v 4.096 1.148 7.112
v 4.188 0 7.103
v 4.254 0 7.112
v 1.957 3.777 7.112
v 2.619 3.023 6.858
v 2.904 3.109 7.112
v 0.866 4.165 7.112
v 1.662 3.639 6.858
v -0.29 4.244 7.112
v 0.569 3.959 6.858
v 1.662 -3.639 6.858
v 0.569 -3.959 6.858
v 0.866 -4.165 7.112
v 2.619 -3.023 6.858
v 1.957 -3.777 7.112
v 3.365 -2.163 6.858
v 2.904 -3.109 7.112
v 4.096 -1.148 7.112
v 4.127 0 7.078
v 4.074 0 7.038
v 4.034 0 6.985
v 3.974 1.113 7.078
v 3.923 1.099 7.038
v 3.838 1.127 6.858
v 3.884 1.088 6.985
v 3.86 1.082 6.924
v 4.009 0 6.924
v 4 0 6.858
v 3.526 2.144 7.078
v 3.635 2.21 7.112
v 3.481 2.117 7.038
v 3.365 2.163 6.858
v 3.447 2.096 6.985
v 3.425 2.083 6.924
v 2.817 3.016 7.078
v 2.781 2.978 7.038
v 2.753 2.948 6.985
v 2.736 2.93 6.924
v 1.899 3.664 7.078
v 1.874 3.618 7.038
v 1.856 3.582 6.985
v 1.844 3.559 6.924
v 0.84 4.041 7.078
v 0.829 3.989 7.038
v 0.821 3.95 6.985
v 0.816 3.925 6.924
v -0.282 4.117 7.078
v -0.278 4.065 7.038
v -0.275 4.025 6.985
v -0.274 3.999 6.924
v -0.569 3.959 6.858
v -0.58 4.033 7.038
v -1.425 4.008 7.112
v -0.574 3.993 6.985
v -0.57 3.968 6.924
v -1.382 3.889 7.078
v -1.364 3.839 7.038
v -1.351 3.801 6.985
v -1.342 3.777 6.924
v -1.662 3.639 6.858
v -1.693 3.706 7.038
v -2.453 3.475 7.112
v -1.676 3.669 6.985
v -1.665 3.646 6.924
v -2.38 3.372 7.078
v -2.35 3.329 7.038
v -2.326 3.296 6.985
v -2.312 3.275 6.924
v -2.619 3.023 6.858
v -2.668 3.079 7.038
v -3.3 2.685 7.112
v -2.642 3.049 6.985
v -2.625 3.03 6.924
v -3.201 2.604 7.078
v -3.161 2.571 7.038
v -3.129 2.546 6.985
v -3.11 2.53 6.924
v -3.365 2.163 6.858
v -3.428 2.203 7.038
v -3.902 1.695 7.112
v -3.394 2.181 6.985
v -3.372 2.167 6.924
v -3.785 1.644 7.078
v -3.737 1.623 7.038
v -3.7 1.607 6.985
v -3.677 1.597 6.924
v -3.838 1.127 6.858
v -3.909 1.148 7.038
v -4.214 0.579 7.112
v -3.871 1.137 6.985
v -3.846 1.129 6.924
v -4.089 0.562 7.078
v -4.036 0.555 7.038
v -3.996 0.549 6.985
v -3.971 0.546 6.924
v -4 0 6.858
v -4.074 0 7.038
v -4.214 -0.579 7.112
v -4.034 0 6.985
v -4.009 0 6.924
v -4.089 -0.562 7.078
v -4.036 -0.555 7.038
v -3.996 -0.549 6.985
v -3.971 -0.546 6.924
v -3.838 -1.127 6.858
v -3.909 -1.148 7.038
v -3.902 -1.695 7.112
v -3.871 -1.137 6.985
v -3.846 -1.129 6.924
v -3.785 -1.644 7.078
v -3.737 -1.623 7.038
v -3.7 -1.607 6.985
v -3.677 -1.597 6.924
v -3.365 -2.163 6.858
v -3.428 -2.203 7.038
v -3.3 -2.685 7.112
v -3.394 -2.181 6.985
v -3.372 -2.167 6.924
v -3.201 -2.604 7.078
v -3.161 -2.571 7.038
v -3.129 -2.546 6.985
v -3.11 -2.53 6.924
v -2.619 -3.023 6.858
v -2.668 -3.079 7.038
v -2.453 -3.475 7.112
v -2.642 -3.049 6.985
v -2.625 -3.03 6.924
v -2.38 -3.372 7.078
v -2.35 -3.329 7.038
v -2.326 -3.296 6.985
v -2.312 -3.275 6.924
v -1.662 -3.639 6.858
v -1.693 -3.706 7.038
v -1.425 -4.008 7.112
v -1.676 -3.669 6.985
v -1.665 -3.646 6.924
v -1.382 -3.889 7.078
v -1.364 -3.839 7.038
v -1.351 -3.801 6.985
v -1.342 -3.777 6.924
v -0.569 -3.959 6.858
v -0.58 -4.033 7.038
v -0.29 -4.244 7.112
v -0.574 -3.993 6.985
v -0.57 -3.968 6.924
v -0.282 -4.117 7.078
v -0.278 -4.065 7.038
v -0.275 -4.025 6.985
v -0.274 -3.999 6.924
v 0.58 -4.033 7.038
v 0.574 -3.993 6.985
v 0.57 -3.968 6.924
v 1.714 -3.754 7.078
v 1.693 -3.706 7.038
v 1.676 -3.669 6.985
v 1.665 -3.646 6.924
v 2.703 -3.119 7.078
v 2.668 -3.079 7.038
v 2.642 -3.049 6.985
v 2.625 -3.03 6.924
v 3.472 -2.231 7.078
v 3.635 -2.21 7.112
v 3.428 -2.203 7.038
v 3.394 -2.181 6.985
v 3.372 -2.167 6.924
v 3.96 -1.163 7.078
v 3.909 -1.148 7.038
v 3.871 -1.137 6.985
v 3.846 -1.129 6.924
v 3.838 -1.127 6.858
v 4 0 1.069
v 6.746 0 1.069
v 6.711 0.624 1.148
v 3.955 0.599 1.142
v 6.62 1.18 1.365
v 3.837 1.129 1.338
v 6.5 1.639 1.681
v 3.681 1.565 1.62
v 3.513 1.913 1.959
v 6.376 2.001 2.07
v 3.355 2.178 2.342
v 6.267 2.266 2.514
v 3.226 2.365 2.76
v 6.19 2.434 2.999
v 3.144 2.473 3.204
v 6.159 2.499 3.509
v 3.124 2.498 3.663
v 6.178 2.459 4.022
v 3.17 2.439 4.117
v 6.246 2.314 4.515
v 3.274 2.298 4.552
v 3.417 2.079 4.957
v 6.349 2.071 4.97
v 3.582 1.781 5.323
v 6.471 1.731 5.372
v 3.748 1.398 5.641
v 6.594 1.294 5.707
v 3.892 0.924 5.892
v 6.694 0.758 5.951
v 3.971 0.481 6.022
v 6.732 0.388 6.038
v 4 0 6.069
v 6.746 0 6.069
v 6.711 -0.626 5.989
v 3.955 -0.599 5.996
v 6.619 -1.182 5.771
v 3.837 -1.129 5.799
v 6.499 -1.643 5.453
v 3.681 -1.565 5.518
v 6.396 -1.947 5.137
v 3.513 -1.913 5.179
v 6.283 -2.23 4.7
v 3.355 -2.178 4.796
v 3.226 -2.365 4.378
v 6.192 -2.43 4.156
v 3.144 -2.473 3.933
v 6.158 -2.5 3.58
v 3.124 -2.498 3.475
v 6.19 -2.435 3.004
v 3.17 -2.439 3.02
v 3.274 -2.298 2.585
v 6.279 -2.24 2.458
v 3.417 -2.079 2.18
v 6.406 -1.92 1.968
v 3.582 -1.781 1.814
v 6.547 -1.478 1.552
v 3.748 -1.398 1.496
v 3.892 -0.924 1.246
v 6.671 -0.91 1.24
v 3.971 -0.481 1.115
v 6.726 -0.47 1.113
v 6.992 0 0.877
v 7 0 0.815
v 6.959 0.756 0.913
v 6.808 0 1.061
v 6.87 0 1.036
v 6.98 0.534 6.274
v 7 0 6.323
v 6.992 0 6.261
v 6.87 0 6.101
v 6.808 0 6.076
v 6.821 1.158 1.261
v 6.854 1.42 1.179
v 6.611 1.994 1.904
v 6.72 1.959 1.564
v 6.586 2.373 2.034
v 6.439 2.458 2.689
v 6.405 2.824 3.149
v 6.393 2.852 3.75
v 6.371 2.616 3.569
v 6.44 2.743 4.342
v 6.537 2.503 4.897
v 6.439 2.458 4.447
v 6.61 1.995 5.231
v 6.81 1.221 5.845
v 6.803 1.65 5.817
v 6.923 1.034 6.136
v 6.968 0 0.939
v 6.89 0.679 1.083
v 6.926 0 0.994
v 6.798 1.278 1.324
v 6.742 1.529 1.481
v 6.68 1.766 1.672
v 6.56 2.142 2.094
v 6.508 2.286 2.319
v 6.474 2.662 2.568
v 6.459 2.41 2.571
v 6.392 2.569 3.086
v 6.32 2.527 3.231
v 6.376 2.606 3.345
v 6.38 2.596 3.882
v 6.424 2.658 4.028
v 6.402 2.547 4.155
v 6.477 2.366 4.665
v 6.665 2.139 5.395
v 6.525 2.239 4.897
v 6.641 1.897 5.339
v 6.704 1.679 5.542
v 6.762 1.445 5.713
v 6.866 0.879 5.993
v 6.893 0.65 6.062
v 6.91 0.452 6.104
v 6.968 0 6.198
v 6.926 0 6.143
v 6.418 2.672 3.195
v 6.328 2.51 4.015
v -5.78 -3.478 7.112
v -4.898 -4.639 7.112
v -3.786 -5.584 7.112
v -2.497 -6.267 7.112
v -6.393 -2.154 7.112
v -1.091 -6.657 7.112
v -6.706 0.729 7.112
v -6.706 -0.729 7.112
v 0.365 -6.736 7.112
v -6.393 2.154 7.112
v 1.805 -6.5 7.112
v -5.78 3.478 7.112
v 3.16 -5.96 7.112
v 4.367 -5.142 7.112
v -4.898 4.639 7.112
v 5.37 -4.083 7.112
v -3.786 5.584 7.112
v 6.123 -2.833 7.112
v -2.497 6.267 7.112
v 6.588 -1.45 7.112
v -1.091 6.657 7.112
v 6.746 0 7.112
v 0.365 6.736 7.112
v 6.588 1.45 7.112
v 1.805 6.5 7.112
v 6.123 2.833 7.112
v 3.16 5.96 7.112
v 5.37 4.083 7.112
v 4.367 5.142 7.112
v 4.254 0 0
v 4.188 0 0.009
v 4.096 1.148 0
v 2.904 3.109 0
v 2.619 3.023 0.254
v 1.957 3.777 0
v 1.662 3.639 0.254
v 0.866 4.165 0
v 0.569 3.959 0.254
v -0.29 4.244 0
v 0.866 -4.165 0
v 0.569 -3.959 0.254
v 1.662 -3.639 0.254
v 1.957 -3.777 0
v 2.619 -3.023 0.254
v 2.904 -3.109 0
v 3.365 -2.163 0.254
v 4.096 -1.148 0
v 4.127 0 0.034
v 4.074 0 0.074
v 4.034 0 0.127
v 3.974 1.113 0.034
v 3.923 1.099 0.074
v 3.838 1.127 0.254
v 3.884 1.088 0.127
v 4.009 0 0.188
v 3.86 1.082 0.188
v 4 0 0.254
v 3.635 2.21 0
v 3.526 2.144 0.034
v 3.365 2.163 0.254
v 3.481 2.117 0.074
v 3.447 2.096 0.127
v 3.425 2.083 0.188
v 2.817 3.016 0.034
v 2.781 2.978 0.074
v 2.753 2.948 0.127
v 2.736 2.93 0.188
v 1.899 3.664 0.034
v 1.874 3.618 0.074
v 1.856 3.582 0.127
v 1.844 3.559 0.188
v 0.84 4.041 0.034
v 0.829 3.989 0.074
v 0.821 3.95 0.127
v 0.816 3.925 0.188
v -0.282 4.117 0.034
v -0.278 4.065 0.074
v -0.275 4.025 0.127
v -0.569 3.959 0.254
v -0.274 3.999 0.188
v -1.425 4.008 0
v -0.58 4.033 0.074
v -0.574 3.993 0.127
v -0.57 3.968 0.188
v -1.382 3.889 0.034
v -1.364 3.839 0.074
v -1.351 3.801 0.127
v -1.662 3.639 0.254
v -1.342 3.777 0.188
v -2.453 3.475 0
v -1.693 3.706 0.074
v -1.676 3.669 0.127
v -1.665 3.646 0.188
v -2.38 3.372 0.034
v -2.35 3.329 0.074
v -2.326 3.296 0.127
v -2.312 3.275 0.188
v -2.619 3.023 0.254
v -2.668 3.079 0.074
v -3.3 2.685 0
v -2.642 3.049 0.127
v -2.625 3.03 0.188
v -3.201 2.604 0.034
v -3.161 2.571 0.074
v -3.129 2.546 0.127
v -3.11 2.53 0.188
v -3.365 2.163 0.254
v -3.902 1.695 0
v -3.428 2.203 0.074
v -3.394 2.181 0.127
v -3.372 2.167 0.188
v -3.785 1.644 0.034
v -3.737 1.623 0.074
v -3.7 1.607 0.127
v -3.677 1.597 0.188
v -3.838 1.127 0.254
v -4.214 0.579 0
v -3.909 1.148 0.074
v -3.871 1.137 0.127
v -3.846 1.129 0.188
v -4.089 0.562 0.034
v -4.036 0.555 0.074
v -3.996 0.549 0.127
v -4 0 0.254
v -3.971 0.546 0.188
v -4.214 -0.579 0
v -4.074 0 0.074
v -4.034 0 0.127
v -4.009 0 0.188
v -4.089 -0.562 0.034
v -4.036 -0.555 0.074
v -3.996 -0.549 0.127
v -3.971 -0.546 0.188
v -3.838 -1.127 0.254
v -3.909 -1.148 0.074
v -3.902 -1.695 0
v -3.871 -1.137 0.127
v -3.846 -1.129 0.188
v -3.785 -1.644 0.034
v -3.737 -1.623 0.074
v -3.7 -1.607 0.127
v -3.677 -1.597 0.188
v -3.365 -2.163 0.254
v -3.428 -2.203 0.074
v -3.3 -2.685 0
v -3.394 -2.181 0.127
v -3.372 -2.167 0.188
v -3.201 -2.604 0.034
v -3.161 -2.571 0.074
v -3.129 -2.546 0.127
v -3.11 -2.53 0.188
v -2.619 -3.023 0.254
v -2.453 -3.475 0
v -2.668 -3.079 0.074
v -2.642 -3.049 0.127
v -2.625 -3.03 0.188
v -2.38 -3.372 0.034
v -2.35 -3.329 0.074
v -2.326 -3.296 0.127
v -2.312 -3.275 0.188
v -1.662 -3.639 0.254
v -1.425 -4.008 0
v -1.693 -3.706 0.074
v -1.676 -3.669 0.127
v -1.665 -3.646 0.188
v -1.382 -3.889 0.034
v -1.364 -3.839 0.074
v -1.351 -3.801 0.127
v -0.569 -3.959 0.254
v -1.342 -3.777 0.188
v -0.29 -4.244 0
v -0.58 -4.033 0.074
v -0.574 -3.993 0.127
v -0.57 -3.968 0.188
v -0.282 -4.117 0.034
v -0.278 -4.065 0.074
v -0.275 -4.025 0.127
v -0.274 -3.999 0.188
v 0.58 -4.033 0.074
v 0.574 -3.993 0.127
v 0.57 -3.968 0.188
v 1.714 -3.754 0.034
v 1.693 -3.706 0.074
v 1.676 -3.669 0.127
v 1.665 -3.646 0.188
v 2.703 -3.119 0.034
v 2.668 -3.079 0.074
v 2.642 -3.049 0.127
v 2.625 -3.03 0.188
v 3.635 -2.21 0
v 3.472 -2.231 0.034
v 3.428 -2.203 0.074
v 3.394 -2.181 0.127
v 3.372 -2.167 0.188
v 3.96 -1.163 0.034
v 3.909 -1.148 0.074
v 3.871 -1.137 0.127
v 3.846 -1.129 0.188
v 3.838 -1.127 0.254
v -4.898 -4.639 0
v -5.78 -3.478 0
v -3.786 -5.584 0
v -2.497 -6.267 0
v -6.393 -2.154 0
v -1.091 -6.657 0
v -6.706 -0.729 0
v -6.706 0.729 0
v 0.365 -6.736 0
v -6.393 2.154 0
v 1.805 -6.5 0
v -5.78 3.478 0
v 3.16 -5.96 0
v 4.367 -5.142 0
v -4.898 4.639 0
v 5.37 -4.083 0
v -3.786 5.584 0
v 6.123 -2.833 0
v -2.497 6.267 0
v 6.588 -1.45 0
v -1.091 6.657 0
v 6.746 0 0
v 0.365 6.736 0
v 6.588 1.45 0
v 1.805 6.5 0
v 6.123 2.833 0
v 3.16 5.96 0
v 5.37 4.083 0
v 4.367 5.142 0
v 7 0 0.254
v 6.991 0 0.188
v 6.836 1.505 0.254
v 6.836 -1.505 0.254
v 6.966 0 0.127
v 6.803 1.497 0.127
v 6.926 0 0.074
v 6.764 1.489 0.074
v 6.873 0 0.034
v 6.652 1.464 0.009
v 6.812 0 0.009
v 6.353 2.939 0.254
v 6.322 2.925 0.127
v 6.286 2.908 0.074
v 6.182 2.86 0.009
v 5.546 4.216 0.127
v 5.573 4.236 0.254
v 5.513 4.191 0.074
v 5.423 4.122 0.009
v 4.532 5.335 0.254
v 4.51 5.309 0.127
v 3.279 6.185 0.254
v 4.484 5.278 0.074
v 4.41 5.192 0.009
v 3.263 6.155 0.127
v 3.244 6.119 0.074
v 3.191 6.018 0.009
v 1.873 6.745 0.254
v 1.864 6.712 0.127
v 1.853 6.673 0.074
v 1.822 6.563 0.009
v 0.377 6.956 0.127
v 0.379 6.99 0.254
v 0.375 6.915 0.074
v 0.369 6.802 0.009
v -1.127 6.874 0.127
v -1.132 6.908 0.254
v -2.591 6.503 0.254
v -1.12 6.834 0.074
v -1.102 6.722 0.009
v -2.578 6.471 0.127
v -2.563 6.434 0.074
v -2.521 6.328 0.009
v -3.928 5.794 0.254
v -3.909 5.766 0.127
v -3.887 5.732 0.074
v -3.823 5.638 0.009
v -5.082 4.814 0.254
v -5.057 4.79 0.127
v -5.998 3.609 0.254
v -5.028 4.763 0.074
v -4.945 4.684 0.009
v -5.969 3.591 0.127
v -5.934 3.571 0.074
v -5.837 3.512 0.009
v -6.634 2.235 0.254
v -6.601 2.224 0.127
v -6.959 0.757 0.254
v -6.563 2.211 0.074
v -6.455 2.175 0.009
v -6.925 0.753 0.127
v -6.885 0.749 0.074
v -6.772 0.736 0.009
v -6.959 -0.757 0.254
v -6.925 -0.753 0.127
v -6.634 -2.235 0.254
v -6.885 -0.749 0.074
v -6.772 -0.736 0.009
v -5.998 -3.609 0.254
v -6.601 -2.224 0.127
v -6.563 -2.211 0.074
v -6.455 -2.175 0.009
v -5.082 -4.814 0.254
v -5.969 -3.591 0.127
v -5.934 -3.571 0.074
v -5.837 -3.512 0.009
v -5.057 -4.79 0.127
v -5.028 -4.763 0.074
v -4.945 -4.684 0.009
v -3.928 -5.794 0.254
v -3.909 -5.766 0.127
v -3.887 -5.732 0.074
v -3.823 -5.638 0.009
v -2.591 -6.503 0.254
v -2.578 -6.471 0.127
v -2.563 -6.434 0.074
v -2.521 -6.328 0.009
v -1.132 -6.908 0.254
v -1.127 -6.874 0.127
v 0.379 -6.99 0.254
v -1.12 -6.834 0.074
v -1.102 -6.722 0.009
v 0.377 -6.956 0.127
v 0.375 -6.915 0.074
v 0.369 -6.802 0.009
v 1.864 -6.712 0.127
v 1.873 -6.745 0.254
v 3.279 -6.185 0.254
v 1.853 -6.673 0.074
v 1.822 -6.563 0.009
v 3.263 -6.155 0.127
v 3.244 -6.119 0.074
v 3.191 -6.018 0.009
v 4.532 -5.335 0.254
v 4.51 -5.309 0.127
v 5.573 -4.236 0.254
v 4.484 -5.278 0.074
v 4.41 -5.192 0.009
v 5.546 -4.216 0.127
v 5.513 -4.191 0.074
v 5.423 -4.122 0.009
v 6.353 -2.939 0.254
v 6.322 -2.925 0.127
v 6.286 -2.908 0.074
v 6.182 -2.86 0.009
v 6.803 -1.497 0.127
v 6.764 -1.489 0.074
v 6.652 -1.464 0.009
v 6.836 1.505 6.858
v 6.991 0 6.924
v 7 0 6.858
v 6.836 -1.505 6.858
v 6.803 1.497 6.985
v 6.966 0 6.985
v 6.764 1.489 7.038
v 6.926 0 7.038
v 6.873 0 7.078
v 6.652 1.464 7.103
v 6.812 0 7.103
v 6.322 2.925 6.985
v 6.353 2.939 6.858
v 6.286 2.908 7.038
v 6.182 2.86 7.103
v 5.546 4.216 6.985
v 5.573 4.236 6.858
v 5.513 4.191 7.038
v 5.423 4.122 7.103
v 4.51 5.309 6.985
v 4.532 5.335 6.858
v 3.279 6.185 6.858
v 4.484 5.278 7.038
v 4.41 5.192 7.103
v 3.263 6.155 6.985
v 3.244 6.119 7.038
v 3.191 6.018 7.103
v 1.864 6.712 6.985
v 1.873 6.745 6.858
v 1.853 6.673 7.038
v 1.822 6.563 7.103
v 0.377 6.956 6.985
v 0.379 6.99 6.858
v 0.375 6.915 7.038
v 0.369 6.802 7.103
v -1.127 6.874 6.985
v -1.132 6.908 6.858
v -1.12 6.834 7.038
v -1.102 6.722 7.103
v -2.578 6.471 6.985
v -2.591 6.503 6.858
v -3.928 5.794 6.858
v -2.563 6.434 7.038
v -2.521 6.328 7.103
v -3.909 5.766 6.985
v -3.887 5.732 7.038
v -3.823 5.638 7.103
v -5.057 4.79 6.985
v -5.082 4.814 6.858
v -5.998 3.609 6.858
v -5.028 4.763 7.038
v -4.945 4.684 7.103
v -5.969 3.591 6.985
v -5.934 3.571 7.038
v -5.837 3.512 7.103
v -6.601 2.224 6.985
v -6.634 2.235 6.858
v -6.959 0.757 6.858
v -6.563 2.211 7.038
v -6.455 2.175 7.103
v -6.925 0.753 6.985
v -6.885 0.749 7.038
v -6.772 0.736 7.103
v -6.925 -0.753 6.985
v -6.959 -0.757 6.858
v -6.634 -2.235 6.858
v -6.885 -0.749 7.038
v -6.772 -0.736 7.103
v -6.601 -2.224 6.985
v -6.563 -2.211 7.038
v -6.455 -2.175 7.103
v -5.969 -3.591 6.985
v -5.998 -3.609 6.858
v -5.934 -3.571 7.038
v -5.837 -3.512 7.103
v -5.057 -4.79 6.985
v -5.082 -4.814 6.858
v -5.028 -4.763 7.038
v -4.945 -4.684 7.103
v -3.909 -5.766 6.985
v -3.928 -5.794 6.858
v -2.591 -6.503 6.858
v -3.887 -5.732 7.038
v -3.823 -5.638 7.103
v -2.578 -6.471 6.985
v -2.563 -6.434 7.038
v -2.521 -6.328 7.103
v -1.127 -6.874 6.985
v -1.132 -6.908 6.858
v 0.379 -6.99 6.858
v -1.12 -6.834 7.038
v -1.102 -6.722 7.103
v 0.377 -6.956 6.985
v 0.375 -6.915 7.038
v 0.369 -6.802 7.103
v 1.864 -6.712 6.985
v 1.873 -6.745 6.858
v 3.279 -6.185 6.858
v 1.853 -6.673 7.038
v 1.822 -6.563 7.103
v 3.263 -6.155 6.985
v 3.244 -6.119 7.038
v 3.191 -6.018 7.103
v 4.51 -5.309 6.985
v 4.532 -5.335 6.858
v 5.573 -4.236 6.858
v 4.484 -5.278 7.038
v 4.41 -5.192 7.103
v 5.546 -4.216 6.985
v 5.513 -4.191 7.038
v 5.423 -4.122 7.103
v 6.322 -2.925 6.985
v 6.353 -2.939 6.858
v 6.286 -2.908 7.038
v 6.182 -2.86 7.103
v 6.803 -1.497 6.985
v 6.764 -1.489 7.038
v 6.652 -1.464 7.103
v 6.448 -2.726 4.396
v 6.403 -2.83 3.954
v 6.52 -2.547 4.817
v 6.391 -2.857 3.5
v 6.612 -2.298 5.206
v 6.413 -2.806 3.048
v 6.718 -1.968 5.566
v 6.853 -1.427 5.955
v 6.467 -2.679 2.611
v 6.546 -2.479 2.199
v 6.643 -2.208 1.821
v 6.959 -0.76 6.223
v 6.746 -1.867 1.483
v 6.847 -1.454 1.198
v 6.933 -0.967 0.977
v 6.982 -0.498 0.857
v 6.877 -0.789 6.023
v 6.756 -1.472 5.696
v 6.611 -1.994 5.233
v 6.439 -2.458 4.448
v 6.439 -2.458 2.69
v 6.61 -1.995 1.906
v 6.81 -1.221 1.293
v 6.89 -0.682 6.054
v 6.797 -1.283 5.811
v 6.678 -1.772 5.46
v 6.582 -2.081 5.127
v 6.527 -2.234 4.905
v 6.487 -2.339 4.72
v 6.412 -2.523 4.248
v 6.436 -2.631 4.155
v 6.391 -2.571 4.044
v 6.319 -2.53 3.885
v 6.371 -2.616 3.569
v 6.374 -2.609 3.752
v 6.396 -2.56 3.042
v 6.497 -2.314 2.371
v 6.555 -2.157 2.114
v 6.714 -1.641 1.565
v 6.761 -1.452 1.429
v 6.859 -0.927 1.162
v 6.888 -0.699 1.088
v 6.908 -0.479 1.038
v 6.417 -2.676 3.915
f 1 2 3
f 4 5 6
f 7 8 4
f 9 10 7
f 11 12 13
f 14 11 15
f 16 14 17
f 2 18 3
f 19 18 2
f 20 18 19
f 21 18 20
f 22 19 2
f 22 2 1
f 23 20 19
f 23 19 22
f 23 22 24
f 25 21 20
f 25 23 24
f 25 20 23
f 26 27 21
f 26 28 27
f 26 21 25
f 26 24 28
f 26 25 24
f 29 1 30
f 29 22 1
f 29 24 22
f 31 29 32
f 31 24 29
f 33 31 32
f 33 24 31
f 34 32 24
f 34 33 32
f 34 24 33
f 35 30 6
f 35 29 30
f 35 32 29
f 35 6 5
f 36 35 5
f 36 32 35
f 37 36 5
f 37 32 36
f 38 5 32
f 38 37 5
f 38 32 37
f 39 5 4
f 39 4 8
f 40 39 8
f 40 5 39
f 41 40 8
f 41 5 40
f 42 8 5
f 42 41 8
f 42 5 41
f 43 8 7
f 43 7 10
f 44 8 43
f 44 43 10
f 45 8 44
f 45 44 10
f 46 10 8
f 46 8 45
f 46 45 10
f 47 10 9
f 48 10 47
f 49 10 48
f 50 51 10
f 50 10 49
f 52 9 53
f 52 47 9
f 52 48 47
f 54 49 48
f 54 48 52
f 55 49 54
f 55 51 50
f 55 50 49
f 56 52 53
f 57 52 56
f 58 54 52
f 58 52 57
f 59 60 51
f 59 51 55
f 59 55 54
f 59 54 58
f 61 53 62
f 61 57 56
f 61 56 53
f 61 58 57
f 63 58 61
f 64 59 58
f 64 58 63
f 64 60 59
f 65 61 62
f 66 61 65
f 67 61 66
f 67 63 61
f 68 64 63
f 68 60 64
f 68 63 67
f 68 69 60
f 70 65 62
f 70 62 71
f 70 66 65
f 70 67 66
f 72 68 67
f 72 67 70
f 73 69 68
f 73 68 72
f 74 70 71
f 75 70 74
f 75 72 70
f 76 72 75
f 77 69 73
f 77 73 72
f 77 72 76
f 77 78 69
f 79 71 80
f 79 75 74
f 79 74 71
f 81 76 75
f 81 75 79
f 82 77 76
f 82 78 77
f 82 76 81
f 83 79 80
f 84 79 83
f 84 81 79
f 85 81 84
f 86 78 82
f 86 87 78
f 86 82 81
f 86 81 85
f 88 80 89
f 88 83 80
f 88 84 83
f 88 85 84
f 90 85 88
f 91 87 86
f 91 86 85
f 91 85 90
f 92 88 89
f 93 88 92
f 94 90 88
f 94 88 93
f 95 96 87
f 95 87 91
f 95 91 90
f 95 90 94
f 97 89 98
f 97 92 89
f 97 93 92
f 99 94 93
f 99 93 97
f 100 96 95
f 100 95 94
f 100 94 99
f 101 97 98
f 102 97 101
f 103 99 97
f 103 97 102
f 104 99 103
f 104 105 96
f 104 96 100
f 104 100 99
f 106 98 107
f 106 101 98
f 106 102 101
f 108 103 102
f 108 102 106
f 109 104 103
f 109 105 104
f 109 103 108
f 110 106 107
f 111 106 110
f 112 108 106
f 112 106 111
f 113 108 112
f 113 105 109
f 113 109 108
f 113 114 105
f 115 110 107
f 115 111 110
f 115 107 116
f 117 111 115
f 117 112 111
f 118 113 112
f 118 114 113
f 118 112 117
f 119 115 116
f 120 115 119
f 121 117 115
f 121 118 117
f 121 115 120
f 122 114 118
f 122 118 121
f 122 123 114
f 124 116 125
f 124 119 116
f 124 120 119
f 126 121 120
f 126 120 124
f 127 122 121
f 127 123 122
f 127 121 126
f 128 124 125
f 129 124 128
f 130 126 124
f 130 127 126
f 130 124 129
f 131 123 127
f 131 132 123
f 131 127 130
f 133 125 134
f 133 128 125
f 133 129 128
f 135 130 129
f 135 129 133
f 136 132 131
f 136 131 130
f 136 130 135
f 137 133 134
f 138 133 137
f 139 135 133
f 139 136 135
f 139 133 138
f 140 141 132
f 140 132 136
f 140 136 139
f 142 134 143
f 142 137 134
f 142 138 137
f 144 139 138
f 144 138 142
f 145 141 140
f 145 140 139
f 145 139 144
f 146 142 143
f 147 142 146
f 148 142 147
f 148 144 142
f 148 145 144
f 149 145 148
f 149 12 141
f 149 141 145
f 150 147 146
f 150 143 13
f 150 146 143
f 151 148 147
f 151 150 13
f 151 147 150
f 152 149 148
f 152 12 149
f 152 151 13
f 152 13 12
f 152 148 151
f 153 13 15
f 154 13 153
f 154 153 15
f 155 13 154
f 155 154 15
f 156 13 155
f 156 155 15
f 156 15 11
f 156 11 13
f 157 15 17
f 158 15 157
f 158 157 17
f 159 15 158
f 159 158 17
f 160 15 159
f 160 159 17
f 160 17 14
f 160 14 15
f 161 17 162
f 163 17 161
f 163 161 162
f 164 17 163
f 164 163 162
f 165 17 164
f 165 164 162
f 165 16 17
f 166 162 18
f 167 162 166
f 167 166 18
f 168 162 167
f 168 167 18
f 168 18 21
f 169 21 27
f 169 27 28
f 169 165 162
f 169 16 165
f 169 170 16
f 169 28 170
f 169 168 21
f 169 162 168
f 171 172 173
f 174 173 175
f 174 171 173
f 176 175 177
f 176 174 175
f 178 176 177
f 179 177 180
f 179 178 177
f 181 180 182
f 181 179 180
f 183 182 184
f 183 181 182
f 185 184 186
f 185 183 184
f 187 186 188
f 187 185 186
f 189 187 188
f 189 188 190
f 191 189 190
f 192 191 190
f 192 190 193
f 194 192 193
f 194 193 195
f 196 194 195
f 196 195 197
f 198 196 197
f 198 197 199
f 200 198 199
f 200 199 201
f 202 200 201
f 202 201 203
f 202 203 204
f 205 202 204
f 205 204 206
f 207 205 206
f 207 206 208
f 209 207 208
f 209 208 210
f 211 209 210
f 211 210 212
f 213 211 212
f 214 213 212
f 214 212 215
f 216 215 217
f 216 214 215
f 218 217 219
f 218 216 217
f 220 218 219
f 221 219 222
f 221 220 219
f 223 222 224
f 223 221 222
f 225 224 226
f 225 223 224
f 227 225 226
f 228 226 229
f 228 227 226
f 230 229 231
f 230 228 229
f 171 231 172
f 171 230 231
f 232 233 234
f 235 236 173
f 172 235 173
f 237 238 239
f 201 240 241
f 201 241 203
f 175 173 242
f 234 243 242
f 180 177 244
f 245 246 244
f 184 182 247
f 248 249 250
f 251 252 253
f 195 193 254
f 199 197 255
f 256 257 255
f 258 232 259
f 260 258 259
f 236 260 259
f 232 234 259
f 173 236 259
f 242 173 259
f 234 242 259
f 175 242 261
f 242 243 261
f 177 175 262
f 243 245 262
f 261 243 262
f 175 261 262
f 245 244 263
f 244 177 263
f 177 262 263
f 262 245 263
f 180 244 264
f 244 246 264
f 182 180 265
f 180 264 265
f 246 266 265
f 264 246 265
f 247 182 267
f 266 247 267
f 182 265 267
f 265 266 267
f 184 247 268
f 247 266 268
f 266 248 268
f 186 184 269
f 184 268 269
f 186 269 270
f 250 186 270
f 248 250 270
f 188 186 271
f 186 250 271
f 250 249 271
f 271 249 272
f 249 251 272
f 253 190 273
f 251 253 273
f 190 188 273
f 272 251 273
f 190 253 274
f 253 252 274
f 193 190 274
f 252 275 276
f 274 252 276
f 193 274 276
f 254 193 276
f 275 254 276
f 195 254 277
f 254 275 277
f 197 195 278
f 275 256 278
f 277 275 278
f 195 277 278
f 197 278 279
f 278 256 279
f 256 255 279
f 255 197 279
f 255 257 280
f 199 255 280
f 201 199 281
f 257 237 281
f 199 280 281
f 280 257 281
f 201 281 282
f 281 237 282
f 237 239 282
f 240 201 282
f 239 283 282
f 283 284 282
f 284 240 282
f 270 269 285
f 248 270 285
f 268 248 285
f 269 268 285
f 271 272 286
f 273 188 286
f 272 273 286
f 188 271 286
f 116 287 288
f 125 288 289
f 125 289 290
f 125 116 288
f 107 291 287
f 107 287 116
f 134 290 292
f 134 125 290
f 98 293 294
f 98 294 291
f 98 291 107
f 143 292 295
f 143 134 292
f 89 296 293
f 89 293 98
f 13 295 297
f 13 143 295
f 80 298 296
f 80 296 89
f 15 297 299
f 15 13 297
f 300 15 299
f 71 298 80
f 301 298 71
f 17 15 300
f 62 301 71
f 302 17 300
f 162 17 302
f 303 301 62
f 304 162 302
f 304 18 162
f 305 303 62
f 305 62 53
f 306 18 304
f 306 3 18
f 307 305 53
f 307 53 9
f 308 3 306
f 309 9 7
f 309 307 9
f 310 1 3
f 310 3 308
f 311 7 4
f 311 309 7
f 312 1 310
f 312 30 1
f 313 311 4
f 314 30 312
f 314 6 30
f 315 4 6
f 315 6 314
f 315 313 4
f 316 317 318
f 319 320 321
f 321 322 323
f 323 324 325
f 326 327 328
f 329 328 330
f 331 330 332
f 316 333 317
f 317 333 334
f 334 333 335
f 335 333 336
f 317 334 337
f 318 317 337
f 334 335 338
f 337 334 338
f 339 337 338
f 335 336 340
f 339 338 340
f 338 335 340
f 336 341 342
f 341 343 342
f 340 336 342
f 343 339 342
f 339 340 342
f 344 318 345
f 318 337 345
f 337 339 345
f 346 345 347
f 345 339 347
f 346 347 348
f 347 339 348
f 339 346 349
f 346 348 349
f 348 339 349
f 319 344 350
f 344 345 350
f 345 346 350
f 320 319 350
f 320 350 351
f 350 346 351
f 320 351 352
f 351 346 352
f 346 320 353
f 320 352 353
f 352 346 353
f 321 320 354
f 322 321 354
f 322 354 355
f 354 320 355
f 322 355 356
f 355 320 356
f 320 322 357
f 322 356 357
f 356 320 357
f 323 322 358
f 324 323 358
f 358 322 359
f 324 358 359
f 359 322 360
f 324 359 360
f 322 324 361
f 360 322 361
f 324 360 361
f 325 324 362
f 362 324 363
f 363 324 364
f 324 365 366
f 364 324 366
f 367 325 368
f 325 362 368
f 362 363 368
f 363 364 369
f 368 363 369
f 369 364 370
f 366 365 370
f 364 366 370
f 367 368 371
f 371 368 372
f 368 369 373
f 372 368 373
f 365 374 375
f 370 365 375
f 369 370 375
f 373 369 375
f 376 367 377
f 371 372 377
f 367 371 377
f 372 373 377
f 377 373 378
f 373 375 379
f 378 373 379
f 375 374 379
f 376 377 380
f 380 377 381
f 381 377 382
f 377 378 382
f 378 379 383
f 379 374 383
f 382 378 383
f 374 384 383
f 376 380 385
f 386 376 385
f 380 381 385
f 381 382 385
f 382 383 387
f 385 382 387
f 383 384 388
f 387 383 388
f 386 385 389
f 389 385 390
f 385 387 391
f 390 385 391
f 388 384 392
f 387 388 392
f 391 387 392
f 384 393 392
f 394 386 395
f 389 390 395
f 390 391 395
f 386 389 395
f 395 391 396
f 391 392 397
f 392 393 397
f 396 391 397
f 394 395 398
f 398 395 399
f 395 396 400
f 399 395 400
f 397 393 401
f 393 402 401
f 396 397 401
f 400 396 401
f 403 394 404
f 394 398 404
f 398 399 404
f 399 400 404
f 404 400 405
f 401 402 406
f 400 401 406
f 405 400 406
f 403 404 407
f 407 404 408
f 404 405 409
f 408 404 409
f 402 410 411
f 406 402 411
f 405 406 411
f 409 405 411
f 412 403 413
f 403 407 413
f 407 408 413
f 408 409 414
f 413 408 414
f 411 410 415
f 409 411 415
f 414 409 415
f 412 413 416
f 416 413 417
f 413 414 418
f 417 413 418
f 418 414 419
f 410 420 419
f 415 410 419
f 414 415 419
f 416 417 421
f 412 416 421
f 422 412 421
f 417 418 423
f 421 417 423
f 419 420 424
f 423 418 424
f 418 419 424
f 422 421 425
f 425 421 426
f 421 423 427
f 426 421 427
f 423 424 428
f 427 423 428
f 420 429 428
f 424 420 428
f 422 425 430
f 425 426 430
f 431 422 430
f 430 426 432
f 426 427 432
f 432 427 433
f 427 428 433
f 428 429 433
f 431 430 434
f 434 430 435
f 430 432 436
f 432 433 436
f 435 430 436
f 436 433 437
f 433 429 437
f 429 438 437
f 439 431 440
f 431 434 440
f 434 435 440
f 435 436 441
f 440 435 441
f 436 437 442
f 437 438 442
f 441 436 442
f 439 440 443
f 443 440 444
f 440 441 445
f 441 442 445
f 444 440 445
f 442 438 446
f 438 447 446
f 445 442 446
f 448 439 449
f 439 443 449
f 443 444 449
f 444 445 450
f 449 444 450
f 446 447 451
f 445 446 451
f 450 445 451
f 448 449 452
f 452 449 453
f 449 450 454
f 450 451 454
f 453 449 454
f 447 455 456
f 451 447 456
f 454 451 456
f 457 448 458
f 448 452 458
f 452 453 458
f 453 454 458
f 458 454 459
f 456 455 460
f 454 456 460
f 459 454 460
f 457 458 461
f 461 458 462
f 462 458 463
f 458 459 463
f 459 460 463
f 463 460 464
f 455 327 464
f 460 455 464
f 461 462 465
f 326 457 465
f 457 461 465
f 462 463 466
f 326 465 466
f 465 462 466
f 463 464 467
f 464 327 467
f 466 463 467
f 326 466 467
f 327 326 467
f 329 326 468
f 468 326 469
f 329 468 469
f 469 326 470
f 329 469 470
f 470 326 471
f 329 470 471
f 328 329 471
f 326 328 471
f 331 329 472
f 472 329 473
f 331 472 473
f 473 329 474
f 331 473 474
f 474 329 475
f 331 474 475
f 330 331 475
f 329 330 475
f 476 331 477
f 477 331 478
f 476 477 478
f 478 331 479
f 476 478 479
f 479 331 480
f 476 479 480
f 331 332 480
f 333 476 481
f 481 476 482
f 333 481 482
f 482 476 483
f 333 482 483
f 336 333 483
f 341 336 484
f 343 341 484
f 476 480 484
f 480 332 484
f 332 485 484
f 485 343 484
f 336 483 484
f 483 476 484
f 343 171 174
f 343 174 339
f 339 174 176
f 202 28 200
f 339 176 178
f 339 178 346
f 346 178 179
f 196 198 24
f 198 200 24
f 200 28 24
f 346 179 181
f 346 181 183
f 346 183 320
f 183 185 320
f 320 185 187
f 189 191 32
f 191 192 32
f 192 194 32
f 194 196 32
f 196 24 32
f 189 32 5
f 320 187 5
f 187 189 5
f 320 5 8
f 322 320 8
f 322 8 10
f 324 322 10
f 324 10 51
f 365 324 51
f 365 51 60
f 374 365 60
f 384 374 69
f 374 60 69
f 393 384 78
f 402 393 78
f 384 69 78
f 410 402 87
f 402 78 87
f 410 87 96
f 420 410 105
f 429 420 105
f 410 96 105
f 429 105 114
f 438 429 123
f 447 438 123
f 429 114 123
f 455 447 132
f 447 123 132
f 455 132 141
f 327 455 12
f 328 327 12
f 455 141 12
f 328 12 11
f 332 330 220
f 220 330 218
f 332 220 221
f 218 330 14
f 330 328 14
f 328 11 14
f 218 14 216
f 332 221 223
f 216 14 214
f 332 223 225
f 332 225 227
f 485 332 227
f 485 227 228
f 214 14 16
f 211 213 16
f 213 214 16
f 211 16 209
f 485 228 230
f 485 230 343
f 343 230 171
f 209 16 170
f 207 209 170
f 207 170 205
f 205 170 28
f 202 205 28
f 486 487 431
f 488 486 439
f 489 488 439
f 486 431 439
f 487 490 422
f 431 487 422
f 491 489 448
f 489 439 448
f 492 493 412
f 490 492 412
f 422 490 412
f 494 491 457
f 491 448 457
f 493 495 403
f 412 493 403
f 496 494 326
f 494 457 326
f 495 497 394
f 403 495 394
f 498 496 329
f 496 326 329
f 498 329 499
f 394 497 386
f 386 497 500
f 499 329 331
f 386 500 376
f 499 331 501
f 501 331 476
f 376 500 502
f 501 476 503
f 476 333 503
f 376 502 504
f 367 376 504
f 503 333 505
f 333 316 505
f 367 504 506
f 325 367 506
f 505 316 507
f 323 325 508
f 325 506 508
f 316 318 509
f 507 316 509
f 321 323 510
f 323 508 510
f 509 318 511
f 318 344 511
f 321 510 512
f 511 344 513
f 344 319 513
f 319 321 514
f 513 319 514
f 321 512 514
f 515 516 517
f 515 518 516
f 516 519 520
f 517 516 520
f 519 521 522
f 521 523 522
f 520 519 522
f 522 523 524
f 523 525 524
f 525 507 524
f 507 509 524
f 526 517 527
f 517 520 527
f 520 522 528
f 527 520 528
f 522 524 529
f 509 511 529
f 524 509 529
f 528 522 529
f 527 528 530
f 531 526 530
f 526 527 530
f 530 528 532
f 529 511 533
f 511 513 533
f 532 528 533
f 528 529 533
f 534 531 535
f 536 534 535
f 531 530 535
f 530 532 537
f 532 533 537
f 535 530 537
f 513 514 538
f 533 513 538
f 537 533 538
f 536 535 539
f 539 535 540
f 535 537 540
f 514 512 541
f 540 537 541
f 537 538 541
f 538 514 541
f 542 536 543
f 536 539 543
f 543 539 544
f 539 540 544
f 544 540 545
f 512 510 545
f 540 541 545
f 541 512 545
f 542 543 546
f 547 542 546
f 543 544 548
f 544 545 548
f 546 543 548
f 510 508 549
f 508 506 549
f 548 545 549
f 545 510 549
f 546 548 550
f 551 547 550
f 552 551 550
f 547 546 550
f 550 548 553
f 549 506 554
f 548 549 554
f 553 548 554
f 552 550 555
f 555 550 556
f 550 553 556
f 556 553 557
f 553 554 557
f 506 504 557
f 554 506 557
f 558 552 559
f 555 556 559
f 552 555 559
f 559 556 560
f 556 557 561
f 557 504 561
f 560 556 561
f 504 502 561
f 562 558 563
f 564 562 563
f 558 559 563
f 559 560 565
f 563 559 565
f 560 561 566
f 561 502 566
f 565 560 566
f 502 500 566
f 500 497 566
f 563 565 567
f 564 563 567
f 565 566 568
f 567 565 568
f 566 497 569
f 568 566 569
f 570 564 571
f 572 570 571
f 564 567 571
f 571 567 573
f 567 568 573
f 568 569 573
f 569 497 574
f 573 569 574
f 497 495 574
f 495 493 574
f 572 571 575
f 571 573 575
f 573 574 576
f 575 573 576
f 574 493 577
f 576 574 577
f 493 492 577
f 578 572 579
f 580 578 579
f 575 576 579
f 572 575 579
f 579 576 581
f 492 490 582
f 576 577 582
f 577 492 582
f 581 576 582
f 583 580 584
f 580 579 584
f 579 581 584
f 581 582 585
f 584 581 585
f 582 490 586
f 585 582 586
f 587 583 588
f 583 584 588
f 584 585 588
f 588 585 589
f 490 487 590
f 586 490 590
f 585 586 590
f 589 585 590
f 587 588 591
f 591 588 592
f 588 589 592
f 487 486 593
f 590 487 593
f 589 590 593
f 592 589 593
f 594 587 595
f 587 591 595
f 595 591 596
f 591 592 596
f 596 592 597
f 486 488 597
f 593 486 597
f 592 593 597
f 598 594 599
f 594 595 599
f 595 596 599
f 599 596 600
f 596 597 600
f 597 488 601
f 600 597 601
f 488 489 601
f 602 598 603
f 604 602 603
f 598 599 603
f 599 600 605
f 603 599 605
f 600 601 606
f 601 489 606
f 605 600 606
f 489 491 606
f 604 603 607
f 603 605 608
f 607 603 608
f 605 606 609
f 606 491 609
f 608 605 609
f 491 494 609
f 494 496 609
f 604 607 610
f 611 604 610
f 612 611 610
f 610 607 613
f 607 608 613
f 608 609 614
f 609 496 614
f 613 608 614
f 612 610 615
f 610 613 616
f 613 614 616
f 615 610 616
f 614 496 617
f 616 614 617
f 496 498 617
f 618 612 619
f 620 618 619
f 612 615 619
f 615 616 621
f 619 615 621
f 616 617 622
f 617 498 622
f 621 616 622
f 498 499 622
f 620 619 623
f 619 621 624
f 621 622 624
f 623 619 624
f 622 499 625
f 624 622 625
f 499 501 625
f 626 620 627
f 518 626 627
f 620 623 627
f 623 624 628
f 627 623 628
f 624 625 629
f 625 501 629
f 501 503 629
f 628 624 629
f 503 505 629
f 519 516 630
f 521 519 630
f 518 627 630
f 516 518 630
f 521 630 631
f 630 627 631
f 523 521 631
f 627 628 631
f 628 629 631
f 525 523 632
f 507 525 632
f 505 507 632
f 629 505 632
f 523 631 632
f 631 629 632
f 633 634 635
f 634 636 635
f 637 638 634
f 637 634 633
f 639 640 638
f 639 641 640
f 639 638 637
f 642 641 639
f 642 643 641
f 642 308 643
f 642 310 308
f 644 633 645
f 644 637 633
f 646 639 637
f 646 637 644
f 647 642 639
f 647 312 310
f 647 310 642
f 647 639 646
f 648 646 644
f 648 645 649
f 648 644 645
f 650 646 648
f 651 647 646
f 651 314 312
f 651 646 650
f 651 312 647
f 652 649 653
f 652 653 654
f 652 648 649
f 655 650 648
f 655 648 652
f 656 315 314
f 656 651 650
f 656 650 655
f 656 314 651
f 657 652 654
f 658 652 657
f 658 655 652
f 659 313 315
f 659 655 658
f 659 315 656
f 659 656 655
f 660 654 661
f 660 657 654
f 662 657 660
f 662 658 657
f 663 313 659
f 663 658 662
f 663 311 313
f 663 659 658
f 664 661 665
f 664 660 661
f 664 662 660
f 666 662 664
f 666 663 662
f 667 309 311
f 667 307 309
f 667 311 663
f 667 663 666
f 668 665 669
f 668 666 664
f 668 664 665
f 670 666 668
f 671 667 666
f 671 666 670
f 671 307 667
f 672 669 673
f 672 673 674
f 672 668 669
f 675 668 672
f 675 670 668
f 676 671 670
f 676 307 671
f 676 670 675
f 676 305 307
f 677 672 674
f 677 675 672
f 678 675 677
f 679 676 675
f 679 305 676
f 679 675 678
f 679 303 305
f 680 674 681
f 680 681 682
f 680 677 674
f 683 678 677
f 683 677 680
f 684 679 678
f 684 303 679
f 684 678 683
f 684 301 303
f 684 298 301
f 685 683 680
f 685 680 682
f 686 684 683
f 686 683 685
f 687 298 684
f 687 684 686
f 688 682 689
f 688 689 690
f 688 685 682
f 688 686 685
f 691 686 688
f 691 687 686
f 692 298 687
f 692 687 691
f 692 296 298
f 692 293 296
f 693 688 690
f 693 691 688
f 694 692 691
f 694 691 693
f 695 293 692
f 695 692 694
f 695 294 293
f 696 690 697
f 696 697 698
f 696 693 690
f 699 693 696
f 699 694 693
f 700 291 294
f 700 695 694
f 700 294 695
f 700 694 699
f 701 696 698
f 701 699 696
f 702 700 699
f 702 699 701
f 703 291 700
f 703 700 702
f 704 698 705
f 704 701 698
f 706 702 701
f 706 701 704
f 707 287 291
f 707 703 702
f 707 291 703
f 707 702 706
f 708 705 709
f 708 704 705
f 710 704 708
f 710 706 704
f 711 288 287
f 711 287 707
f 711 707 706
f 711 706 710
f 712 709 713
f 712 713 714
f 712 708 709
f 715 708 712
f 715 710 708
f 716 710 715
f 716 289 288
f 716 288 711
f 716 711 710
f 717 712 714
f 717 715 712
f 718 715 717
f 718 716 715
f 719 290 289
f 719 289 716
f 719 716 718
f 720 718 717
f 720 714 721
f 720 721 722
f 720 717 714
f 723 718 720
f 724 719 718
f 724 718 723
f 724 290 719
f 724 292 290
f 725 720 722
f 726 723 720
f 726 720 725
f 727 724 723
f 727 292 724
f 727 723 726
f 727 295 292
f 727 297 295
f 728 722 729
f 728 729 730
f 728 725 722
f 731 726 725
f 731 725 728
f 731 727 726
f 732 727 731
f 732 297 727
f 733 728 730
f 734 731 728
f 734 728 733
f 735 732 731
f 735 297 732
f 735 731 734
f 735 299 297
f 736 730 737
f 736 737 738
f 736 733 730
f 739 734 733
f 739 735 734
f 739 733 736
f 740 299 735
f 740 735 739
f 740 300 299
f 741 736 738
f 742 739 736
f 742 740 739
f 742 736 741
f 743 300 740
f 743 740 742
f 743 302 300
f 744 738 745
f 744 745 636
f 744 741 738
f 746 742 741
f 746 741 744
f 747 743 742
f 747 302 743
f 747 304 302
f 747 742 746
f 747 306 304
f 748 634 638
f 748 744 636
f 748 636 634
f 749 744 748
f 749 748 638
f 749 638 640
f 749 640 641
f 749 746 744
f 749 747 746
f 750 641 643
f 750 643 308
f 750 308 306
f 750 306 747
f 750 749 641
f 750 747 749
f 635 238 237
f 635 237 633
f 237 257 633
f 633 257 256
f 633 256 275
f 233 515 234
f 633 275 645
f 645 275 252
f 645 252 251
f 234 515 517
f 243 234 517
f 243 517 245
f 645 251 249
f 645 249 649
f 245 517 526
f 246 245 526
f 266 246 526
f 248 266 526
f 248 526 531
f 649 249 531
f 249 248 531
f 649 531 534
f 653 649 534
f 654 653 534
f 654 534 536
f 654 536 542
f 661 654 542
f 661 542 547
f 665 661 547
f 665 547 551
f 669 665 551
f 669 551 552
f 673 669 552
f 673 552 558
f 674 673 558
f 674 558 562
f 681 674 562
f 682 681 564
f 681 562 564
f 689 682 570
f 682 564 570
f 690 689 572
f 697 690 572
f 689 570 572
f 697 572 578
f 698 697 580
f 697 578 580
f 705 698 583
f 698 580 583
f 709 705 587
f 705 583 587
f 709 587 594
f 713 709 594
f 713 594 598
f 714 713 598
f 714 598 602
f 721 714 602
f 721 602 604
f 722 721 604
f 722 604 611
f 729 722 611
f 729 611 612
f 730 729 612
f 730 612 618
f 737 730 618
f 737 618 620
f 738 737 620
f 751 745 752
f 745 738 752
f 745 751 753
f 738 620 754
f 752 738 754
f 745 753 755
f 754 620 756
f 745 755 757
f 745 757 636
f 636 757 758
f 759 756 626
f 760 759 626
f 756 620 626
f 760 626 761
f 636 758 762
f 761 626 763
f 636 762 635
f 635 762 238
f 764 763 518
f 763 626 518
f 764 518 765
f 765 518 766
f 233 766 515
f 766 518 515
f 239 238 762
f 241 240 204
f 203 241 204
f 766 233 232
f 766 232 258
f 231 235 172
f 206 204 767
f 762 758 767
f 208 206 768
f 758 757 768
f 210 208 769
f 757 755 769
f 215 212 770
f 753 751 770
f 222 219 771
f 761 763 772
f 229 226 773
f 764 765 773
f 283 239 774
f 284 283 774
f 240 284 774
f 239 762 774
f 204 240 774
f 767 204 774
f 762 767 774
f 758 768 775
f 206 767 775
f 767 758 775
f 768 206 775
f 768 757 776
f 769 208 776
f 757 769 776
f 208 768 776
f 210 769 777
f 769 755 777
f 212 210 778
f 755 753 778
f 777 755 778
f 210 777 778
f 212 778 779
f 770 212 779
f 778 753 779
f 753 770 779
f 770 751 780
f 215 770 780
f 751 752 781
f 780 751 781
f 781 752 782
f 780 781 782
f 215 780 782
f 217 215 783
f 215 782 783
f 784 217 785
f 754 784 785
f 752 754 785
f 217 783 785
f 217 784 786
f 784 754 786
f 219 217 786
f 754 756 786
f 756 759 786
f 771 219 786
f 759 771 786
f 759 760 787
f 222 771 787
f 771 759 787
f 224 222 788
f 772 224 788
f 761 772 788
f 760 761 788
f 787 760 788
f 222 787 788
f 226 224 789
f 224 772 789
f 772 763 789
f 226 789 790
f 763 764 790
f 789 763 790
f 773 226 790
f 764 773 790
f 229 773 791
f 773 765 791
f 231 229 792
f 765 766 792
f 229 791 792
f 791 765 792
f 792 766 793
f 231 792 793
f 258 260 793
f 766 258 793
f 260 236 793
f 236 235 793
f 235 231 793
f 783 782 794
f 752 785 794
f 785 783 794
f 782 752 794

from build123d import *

# Parameters (mm, degrees)
SKETCH2_R           = 7
BOSS_EXTRUDE1_DEPTH = 7.112
SKETCH3_R           = 4
CUT_EXTRUDE1_DEPTH  = 19.05
SKETCH4_R           = 2.5
CUT_EXTRUDE2_DEPTH  = 19.05
FILLET1_R           = 0.254


with BuildPart() as part:
    # Sketch2 → Boss-Extrude1 (new body)
    with BuildSketch(Plane.XY):
        Circle(SKETCH2_R)
    extrude(amount=BOSS_EXTRUDE1_DEPTH)

    # Sketch3 → Cut-Extrude1 (cut)
    with BuildSketch(Plane.XY.offset(7.112)):
        Circle(SKETCH3_R)
    extrude(amount=-CUT_EXTRUDE1_DEPTH, mode=Mode.SUBTRACT)

    # Sketch4 → Cut-Extrude2 (cut)
    with BuildSketch(Plane(origin=(0, 0, 0), x_dir=(0, 0, -1), z_dir=(1, 0, 0))):
        with Locations((-3.5687, 0)):
            Circle(SKETCH4_R)
    extrude(amount=CUT_EXTRUDE2_DEPTH, mode=Mode.SUBTRACT)

    # Fillet1
    fillet1_edges = [part.edges().sort_by_distance(p)[0] for p in [
        (6.538348415, 2.5, 3.5687),
        (-7, 0, 0),
        (-7, 0, 7.112),
        (-4, 0, 0),
        (-4, 0, 7.112),
    ]]
    fillet(fillet1_edges, radius=FILLET1_R)


solid = part.part
